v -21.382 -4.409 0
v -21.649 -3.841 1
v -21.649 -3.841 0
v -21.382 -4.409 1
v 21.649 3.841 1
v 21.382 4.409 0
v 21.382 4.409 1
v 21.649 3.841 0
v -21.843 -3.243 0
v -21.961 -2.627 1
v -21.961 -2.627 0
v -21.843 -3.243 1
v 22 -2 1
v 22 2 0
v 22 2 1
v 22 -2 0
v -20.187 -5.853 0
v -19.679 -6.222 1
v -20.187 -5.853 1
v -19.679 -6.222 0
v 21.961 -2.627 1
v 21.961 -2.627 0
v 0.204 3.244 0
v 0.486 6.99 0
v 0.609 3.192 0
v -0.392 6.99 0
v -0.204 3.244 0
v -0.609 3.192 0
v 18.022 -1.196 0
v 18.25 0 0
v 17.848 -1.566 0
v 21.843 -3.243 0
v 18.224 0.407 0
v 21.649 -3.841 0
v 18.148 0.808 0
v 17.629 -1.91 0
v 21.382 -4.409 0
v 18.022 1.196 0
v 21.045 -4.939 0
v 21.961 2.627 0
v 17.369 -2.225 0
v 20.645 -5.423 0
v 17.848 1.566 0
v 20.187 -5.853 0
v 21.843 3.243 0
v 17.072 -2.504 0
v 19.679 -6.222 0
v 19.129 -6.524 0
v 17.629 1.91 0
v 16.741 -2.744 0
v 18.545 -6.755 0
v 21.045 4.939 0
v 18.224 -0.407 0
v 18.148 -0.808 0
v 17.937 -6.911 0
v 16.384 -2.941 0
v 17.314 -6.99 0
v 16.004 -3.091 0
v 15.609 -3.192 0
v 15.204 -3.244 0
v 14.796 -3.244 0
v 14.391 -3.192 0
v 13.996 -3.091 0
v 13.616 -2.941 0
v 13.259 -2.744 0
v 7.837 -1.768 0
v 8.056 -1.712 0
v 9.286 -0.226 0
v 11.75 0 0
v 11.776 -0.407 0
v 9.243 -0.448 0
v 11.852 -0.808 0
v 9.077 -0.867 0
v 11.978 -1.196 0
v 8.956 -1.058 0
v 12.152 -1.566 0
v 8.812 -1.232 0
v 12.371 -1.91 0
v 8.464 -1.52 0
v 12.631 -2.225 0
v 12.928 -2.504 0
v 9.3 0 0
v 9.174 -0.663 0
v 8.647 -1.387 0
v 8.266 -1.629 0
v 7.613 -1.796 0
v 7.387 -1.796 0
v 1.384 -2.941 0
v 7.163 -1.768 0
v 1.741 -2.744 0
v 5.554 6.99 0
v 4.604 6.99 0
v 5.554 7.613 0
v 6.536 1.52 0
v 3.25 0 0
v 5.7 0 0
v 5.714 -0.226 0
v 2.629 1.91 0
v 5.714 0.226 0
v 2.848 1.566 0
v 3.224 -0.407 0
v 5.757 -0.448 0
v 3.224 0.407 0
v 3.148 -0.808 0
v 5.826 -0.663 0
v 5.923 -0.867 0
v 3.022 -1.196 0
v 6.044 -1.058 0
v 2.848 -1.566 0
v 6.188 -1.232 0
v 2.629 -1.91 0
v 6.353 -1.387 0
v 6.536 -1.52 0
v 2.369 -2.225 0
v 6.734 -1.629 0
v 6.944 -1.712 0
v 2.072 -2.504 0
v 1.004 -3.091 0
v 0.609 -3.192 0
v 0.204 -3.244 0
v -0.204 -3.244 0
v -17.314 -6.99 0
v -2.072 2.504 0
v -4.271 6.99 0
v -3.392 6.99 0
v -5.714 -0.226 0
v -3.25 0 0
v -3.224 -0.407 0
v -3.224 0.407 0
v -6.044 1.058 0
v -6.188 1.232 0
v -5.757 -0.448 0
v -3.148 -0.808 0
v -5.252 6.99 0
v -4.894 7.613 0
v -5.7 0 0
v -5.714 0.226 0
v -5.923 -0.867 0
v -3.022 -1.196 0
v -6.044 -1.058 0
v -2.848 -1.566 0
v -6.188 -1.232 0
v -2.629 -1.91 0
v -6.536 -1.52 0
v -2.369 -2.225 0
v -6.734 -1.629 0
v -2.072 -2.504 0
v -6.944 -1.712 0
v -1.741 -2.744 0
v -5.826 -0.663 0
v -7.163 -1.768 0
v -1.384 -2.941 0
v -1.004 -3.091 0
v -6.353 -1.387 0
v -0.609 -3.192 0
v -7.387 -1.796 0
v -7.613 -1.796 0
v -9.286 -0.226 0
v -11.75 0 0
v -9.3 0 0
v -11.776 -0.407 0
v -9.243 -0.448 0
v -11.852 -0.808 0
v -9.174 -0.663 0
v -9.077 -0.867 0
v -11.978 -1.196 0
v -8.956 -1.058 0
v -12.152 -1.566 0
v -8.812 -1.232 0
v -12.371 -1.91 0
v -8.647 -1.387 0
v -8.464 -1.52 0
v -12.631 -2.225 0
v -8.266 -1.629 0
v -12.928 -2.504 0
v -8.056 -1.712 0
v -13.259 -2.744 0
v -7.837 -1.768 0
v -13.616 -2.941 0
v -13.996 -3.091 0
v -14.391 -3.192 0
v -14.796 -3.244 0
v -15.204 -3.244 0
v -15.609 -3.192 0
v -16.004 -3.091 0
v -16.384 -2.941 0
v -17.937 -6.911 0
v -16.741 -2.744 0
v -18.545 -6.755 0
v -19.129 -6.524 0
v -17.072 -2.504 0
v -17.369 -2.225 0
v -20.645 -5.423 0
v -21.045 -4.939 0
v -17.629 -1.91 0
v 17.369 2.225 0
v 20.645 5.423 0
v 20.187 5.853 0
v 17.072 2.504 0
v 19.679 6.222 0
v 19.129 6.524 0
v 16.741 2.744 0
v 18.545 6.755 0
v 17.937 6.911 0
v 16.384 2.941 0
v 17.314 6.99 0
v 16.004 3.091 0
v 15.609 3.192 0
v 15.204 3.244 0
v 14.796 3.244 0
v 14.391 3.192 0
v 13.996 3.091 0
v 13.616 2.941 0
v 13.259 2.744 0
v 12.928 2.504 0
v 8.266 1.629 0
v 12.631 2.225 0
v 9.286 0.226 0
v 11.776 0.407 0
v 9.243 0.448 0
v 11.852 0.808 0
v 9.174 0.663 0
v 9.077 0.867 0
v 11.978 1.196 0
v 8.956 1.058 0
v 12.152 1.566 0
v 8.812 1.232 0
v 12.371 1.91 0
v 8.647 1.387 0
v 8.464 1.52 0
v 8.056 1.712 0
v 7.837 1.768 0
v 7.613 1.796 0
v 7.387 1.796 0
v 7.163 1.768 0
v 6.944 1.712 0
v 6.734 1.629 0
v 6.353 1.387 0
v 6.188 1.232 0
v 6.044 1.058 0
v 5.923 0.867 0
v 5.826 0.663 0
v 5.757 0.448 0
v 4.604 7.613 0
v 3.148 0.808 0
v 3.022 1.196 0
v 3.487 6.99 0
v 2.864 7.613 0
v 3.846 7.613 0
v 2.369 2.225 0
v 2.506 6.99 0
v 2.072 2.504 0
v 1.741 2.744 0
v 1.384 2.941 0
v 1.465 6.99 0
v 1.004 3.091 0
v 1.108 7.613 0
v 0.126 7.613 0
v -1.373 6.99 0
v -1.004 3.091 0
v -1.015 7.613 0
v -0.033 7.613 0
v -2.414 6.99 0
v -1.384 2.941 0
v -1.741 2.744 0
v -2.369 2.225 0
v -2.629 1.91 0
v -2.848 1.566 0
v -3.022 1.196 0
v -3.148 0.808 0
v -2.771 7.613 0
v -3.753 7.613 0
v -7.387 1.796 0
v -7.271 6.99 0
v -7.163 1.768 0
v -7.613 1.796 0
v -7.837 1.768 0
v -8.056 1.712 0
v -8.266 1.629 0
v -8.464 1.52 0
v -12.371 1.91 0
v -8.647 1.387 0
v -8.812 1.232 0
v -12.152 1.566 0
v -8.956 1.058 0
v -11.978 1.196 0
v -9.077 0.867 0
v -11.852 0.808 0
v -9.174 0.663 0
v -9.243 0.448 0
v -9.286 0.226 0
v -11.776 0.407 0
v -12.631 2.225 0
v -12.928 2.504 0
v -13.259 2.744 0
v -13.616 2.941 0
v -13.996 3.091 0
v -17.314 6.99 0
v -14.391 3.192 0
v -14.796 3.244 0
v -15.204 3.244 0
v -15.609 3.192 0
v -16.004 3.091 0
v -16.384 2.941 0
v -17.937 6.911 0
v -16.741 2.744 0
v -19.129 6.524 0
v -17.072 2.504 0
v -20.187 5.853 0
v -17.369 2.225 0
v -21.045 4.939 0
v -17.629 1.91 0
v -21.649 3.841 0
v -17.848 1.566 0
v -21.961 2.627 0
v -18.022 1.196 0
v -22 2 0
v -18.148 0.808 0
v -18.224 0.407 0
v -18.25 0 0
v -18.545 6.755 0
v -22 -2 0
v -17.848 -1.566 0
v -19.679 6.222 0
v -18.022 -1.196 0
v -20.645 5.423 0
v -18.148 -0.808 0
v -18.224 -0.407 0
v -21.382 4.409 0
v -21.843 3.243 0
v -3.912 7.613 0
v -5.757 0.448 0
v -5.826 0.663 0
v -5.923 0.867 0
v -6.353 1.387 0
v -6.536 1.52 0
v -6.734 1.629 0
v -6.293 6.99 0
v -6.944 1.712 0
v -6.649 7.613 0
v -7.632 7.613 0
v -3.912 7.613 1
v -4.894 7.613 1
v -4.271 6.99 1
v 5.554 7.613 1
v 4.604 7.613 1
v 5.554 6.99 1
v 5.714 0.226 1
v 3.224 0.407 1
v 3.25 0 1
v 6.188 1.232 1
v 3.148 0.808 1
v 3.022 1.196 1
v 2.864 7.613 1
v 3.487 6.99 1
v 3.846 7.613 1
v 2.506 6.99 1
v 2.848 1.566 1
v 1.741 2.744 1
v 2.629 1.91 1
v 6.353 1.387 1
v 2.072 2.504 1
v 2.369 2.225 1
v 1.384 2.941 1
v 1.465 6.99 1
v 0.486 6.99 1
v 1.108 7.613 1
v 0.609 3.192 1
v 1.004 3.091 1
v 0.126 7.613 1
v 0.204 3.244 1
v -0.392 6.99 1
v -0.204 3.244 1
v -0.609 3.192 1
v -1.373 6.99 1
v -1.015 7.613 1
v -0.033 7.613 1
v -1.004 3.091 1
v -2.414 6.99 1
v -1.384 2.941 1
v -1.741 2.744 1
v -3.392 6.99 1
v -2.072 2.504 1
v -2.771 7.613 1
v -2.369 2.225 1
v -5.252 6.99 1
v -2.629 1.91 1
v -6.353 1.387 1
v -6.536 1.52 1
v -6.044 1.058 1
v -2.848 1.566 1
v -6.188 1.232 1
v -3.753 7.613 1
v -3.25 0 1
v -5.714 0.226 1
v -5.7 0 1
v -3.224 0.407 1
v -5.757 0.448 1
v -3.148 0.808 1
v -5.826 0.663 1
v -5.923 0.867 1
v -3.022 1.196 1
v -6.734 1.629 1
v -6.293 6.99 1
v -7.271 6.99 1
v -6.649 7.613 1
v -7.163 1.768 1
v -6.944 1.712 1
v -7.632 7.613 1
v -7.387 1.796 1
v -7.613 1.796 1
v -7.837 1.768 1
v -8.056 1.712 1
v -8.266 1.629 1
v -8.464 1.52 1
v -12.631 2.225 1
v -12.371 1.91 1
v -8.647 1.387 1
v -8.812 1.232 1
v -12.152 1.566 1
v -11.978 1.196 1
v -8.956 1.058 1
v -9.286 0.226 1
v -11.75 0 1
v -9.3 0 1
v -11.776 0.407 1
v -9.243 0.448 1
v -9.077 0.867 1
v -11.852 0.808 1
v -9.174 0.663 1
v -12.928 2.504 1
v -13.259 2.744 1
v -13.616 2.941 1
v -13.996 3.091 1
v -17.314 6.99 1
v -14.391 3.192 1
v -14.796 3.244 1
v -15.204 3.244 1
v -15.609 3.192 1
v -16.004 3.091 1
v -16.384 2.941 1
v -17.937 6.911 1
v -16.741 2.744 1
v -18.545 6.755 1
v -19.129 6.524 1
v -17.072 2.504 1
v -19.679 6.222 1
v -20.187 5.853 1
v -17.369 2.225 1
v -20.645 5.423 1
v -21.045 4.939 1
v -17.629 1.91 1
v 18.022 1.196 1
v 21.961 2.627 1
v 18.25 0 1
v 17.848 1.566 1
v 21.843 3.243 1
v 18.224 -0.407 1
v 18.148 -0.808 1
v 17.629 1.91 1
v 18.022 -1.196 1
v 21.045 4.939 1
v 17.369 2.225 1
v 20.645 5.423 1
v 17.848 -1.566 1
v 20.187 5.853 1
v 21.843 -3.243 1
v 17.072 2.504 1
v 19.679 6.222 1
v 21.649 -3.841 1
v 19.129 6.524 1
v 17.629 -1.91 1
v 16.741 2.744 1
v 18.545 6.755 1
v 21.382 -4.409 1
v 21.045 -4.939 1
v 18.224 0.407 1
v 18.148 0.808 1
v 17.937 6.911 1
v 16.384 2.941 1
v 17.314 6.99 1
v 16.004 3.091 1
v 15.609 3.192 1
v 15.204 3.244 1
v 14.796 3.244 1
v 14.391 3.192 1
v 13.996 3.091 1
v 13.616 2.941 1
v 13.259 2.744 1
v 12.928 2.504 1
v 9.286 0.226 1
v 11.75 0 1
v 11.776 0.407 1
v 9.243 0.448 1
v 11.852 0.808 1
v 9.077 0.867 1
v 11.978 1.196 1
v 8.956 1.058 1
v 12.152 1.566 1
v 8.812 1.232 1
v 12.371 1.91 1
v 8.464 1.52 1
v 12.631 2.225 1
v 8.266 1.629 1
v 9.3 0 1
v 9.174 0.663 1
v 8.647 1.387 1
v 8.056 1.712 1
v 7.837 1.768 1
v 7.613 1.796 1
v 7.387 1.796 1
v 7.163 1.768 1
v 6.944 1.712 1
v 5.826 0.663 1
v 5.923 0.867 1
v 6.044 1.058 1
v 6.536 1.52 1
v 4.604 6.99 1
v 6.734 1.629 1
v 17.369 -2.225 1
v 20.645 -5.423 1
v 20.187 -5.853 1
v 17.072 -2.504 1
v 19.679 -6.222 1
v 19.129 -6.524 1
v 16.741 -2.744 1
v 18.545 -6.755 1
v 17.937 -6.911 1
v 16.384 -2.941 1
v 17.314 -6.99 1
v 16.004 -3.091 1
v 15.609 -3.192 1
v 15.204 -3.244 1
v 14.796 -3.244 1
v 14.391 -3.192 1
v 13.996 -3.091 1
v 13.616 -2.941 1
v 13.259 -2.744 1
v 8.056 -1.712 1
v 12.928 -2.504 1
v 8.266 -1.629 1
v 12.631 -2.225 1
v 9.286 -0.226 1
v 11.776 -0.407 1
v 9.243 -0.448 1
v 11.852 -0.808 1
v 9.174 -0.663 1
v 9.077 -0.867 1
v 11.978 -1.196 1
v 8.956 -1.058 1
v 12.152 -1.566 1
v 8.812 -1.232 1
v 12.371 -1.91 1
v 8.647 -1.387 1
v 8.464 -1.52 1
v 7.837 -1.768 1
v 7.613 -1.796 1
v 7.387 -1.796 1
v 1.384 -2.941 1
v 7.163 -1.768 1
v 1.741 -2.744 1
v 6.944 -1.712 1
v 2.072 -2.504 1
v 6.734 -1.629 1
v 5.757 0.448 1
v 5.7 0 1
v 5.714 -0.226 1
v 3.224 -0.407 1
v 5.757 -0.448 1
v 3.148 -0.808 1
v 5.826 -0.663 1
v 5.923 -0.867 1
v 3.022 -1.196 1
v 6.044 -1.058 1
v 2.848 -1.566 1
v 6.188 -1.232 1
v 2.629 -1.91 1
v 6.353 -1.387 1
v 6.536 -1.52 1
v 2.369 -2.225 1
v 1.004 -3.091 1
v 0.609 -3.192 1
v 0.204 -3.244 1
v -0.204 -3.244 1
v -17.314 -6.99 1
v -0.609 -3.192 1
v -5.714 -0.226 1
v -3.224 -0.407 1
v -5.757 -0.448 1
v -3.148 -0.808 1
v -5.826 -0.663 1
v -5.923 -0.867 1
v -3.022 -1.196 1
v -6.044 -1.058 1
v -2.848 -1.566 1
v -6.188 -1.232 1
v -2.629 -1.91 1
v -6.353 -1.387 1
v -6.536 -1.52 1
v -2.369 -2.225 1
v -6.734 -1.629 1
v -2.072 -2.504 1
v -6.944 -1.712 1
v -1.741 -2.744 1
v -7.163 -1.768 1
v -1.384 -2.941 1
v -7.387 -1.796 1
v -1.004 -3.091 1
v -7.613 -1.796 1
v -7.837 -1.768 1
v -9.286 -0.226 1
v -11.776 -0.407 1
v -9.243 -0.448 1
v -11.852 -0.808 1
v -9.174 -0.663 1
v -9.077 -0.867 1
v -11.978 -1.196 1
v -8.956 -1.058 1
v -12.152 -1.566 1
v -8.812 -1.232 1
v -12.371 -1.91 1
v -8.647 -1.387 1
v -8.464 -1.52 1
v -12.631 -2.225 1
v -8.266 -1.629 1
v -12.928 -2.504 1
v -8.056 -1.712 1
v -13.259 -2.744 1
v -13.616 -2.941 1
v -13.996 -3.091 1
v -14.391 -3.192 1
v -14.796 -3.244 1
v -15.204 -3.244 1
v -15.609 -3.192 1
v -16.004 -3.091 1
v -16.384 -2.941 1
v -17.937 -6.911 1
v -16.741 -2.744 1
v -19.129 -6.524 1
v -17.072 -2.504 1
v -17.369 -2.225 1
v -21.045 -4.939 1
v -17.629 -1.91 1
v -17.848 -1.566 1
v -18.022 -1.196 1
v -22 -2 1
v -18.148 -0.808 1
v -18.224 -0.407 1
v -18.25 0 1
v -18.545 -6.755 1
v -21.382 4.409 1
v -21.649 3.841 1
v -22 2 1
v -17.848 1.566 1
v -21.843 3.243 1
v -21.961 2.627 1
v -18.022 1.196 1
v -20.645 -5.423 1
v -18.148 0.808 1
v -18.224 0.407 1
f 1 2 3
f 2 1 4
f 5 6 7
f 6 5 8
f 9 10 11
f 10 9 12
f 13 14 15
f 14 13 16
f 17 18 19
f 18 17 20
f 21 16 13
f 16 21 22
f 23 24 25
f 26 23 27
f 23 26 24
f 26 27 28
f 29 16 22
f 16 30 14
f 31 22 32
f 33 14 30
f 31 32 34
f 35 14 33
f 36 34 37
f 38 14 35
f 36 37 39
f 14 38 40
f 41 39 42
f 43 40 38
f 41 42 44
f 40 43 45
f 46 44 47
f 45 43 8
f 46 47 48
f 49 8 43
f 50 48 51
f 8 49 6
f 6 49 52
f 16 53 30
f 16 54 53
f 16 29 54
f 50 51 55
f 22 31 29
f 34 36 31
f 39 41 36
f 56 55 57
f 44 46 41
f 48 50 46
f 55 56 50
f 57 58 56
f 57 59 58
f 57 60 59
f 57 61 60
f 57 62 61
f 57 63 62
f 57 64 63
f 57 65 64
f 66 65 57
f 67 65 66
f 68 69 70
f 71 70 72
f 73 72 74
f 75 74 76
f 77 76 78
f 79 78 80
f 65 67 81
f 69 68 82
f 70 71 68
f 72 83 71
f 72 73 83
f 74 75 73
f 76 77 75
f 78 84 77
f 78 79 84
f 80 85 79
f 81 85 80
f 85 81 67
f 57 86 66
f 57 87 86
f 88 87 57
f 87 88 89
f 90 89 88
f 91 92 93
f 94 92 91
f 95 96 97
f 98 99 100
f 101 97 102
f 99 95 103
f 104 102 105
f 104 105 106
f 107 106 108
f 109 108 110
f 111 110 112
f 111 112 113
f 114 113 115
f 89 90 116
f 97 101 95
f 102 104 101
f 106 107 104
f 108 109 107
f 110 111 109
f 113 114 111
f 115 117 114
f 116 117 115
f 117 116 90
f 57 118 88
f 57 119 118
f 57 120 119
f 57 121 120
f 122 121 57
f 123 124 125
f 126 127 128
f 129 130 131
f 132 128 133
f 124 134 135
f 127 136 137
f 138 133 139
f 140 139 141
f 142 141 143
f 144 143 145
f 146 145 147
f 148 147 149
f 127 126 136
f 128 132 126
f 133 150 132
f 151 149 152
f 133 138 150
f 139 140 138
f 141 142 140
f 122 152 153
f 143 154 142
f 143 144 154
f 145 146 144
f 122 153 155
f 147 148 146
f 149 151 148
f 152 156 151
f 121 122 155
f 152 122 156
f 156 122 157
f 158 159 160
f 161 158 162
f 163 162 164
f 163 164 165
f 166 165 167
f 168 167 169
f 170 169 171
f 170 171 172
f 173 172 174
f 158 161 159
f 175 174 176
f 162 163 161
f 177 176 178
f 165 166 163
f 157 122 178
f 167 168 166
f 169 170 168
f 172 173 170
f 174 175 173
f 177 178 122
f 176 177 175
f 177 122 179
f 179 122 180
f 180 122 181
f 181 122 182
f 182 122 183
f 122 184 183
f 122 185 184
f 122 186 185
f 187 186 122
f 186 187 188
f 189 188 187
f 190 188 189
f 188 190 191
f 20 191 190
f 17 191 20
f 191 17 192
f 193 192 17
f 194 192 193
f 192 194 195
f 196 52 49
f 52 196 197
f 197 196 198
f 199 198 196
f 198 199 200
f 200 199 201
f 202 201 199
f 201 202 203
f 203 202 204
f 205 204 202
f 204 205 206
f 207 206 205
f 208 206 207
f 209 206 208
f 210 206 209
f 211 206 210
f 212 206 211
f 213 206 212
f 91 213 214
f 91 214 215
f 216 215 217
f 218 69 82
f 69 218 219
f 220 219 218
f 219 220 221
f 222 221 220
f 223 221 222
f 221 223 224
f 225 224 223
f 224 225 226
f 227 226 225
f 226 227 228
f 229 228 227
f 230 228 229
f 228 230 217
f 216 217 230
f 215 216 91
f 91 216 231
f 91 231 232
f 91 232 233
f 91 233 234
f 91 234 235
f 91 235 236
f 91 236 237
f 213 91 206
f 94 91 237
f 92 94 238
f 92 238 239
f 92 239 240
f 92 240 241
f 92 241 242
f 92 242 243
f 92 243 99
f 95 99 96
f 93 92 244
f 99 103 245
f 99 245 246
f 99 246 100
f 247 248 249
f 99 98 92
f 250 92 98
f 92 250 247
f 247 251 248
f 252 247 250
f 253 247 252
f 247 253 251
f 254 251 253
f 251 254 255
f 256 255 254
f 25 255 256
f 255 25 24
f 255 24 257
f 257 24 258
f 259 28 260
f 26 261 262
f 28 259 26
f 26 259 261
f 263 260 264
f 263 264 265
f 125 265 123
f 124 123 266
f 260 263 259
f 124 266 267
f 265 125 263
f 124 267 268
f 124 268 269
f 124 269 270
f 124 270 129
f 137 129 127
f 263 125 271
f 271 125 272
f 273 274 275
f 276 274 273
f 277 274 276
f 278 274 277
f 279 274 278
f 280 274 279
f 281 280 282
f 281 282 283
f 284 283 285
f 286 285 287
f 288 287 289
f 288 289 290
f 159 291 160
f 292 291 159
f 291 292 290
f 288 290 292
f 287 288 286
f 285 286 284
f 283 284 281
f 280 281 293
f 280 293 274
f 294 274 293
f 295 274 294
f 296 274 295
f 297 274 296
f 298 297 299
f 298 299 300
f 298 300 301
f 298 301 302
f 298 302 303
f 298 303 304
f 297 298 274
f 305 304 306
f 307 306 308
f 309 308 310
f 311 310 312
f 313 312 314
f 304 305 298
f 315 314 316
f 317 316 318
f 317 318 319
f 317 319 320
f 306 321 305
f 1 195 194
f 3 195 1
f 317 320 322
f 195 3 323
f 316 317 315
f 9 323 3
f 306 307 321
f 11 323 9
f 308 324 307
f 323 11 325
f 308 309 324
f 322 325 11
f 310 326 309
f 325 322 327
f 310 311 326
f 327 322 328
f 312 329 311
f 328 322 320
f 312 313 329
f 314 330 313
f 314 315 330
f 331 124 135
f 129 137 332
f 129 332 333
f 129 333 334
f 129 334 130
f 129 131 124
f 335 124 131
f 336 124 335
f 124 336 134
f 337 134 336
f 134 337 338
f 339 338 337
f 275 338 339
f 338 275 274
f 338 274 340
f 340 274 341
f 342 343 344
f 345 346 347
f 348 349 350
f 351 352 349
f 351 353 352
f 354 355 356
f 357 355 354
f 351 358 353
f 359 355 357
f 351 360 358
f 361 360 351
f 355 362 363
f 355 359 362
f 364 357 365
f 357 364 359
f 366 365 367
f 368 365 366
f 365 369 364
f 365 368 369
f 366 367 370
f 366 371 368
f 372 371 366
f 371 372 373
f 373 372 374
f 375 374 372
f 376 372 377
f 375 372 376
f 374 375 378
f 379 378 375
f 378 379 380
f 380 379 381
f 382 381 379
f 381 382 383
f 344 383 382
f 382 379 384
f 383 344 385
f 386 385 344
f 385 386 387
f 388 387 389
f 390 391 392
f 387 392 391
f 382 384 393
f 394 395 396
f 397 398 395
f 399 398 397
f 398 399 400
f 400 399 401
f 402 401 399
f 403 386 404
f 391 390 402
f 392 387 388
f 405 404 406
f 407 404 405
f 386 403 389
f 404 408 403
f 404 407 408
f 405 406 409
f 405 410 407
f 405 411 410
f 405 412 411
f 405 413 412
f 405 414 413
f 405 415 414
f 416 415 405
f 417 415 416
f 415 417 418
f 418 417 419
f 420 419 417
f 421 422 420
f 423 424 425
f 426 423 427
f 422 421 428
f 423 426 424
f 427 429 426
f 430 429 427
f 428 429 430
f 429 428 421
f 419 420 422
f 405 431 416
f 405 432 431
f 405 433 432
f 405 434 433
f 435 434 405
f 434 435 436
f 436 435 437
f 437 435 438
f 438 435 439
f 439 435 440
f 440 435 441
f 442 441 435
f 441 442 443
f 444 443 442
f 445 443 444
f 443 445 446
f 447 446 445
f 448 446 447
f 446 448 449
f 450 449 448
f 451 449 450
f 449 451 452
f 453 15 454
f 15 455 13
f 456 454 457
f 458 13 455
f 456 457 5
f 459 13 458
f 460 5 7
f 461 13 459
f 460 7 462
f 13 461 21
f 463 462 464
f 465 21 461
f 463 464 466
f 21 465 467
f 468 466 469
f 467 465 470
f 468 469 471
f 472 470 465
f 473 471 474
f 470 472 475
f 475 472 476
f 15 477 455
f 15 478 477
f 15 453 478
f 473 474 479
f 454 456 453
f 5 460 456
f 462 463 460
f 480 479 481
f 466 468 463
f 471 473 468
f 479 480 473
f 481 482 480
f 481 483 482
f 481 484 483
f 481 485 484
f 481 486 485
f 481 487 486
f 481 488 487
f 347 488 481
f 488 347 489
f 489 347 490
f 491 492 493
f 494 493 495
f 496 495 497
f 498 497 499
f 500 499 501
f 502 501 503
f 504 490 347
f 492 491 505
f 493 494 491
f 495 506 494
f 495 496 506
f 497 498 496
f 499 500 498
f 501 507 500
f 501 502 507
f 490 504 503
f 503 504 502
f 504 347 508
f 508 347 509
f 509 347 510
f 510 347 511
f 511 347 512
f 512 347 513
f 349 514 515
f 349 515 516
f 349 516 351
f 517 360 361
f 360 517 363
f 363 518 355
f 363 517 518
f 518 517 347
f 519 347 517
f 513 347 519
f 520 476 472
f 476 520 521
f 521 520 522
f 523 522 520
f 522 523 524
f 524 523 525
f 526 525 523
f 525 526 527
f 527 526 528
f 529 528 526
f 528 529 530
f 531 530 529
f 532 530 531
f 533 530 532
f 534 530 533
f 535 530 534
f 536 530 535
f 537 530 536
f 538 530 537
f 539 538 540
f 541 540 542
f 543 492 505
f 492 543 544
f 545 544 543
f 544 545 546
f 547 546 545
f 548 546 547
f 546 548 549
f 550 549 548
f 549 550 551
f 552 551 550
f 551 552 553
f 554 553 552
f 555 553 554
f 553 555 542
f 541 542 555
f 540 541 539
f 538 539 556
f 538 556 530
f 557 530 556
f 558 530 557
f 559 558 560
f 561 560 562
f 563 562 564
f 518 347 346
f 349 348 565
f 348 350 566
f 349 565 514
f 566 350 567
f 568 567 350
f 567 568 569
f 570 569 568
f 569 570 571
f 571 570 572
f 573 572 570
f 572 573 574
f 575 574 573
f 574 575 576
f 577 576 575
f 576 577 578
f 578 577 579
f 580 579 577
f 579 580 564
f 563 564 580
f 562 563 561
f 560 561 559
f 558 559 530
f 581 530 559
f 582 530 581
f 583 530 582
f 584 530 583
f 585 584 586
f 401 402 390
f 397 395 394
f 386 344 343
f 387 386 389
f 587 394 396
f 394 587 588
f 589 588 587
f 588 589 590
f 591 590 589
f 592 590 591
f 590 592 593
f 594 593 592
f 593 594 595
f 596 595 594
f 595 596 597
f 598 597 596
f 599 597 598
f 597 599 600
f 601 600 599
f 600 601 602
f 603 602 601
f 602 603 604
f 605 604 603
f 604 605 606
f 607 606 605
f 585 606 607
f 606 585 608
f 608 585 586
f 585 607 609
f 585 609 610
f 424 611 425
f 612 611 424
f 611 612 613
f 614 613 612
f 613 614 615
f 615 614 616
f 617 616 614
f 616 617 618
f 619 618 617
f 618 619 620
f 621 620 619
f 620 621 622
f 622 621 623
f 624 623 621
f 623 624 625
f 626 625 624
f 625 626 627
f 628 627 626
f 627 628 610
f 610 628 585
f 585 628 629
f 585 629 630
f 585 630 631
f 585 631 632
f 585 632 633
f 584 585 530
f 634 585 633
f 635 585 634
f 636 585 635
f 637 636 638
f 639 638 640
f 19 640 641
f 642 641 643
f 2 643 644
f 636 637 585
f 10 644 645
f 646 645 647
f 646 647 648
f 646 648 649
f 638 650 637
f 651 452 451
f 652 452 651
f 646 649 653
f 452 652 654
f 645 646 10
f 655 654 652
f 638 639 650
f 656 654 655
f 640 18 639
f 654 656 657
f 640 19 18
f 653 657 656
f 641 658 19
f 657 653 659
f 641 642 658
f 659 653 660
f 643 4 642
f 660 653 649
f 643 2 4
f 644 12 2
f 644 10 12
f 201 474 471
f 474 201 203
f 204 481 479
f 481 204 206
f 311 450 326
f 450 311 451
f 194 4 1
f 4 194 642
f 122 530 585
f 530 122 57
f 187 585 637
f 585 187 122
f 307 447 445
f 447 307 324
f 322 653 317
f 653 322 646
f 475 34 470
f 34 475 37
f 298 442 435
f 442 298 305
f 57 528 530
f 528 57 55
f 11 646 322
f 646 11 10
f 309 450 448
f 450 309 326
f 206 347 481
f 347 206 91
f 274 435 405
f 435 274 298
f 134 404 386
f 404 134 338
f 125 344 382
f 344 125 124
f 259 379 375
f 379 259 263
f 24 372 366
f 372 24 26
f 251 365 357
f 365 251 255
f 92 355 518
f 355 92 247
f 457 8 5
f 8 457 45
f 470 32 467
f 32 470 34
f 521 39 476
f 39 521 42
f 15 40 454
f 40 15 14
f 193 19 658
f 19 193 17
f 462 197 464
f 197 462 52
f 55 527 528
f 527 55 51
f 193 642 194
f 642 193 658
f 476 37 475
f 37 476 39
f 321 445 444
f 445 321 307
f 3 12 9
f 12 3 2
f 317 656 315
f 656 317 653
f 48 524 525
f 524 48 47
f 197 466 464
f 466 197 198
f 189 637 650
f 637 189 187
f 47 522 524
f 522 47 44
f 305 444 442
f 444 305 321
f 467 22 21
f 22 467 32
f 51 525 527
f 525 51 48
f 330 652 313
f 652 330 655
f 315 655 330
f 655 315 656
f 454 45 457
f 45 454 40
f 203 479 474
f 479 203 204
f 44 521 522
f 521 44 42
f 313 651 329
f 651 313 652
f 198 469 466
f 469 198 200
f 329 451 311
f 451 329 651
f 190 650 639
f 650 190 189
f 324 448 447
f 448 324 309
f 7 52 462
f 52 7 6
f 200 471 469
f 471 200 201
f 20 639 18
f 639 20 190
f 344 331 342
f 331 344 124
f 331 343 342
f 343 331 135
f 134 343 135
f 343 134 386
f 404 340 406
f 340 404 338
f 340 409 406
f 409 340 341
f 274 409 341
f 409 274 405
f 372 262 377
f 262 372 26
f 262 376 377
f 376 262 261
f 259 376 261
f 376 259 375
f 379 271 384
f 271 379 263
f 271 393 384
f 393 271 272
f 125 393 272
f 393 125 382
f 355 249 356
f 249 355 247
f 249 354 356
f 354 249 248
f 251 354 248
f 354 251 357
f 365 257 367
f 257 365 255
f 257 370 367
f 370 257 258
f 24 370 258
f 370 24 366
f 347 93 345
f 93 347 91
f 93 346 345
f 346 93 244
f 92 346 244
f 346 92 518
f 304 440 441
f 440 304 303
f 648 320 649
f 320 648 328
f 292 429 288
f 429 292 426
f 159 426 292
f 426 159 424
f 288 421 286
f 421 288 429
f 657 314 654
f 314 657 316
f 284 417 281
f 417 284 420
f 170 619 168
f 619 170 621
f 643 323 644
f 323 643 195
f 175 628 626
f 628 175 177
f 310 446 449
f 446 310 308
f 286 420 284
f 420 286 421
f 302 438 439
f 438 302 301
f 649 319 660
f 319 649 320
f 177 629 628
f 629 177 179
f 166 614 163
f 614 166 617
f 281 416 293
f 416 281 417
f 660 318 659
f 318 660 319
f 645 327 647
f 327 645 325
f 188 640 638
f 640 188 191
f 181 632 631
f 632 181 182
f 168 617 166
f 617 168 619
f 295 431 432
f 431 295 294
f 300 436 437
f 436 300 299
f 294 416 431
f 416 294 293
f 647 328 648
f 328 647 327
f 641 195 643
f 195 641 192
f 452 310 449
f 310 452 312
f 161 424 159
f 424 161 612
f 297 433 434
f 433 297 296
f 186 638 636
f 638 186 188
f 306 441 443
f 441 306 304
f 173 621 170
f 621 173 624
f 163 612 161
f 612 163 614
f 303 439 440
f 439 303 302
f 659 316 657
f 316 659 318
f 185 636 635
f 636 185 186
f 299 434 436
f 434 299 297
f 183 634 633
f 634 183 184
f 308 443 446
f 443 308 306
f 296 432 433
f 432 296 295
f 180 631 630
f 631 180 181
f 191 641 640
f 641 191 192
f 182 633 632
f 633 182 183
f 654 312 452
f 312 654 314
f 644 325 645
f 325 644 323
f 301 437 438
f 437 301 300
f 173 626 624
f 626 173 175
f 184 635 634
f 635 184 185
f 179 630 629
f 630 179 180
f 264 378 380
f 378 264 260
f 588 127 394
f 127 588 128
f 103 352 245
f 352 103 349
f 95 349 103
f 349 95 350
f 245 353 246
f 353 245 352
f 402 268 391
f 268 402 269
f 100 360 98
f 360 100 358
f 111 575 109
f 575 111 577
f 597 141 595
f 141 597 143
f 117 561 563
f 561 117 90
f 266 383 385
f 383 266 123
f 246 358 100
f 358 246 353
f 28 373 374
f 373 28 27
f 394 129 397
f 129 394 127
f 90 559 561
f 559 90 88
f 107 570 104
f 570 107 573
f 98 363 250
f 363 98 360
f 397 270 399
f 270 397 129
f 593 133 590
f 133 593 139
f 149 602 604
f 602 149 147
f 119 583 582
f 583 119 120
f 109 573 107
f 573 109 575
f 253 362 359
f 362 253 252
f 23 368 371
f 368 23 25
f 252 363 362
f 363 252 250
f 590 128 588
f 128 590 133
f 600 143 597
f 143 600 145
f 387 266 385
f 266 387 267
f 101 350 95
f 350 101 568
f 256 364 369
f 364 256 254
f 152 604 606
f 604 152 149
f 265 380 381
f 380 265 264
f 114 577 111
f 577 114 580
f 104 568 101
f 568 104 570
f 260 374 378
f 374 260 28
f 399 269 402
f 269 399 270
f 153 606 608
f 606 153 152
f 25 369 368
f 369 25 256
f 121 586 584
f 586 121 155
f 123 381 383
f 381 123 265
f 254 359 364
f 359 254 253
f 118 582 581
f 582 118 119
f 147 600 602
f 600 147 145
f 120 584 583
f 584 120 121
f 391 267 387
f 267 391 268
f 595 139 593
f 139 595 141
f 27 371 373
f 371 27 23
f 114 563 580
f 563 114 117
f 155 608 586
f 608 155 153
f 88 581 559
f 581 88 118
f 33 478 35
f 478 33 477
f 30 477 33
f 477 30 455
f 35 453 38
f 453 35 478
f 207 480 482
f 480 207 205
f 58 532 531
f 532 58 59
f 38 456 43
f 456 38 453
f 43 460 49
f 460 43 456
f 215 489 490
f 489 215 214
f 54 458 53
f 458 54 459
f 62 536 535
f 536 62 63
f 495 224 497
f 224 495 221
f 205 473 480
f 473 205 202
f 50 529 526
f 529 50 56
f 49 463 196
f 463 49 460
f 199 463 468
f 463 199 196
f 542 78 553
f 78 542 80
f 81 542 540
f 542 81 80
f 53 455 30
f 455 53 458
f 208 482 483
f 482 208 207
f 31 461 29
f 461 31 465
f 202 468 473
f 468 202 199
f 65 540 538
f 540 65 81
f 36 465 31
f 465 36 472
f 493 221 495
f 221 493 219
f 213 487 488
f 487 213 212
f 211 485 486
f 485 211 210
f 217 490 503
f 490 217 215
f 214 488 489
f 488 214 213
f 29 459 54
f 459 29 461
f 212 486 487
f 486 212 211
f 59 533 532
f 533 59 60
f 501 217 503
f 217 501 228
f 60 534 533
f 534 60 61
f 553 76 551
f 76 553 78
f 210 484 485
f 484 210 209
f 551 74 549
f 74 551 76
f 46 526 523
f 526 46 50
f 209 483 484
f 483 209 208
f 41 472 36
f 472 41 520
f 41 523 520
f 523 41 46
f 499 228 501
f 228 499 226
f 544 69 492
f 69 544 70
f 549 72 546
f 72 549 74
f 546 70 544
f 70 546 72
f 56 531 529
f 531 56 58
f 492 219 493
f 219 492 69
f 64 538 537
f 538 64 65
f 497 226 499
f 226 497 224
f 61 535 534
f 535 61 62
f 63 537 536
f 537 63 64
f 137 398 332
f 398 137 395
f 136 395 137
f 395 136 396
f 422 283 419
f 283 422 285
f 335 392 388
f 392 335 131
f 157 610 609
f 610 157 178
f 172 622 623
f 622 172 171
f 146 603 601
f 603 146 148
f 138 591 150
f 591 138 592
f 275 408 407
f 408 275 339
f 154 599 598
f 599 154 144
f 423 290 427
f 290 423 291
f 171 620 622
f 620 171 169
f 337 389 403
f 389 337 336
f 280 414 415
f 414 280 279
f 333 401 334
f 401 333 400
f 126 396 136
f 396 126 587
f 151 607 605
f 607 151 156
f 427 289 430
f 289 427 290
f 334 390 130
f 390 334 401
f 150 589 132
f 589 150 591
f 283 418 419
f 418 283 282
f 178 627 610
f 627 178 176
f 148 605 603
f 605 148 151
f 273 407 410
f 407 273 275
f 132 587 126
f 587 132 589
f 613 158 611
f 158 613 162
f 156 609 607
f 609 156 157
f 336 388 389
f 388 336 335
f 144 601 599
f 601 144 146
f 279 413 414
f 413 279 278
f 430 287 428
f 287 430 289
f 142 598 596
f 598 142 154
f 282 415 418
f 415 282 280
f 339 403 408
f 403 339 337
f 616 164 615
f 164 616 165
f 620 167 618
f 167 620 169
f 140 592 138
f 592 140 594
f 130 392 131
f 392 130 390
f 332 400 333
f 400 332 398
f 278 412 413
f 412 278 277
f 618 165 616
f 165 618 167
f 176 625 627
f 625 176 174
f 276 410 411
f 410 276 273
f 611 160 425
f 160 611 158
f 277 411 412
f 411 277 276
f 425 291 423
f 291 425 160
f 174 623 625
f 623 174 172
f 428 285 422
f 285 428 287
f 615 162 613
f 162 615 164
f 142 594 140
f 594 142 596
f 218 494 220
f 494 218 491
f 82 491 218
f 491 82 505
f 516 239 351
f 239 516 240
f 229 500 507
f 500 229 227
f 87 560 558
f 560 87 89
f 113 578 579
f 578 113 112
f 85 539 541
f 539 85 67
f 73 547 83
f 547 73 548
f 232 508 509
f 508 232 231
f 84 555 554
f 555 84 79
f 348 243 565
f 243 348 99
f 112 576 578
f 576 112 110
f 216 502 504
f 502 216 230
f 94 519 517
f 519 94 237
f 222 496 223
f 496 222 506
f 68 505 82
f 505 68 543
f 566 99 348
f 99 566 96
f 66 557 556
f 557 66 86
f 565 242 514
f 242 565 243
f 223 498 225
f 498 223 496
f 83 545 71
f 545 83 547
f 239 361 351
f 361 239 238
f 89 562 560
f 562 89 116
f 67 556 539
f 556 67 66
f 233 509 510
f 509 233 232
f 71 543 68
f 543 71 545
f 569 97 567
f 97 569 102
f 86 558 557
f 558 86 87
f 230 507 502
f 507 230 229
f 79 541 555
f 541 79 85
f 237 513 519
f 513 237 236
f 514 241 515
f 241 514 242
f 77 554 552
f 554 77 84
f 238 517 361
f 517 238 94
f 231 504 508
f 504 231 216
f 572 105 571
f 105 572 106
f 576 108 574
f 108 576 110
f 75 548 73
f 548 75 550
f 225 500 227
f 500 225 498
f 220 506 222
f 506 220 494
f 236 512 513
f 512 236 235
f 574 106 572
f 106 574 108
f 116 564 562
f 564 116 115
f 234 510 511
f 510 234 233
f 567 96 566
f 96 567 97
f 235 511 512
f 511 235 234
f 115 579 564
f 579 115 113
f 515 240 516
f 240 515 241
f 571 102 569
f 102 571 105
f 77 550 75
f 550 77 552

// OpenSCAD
$fn = 50;


difference() {
	union() {
		hull() {
			translate(v = [-17.0000000000, 2.0000000000, 0]) {
				cylinder(h = 1, r = 5);
			}
			translate(v = [17.0000000000, 2.0000000000, 0]) {
				cylinder(h = 1, r = 5);
			}
			translate(v = [-17.0000000000, -2.0000000000, 0]) {
				cylinder(h = 1, r = 5);
			}
			translate(v = [17.0000000000, -2.0000000000, 0]) {
				cylinder(h = 1, r = 5);
			}
		}
		translate(v = [0, 7.5000000000, 0]) {
			linear_extrude(height = 1) {
				text(font = "DejaVu Sans Mono:style=Bold", halign = "center", size = 4.7500000000, text = "XXXL", valign = "top");
			}
		}
	}
	union() {
		translate(v = [-15.0000000000, 0.0000000000, 0]) {
			translate(v = [0, 0, -100]) {
				cylinder(h = 200, r = 3.2500000000);
			}
		}
		translate(v = [0, 0, -100]) {
			cylinder(h = 200, r = 3.2500000000);
		}
		translate(v = [15.0000000000, 0.0000000000, 0]) {
			translate(v = [0, 0, -100]) {
				cylinder(h = 200, r = 3.2500000000);
			}
		}
		translate(v = [-15.0000000000, 0.0000000000, 0]) {
			translate(v = [0, 0, -100]) {
				cylinder(h = 200, r = 1.8000000000);
			}
		}
		translate(v = [-7.5000000000, 0.0000000000, 0]) {
			translate(v = [0, 0, -100]) {
				cylinder(h = 200, r = 1.8000000000);
			}
		}
		translate(v = [0, 0, -100]) {
			cylinder(h = 200, r = 1.8000000000);
		}
		translate(v = [7.5000000000, 0.0000000000, 0]) {
			translate(v = [0, 0, -100]) {
				cylinder(h = 200, r = 1.8000000000);
			}
		}
		translate(v = [15.0000000000, 0.0000000000, 0]) {
			translate(v = [0, 0, -100]) {
				cylinder(h = 200, r = 1.8000000000);
			}
		}
	}
}
